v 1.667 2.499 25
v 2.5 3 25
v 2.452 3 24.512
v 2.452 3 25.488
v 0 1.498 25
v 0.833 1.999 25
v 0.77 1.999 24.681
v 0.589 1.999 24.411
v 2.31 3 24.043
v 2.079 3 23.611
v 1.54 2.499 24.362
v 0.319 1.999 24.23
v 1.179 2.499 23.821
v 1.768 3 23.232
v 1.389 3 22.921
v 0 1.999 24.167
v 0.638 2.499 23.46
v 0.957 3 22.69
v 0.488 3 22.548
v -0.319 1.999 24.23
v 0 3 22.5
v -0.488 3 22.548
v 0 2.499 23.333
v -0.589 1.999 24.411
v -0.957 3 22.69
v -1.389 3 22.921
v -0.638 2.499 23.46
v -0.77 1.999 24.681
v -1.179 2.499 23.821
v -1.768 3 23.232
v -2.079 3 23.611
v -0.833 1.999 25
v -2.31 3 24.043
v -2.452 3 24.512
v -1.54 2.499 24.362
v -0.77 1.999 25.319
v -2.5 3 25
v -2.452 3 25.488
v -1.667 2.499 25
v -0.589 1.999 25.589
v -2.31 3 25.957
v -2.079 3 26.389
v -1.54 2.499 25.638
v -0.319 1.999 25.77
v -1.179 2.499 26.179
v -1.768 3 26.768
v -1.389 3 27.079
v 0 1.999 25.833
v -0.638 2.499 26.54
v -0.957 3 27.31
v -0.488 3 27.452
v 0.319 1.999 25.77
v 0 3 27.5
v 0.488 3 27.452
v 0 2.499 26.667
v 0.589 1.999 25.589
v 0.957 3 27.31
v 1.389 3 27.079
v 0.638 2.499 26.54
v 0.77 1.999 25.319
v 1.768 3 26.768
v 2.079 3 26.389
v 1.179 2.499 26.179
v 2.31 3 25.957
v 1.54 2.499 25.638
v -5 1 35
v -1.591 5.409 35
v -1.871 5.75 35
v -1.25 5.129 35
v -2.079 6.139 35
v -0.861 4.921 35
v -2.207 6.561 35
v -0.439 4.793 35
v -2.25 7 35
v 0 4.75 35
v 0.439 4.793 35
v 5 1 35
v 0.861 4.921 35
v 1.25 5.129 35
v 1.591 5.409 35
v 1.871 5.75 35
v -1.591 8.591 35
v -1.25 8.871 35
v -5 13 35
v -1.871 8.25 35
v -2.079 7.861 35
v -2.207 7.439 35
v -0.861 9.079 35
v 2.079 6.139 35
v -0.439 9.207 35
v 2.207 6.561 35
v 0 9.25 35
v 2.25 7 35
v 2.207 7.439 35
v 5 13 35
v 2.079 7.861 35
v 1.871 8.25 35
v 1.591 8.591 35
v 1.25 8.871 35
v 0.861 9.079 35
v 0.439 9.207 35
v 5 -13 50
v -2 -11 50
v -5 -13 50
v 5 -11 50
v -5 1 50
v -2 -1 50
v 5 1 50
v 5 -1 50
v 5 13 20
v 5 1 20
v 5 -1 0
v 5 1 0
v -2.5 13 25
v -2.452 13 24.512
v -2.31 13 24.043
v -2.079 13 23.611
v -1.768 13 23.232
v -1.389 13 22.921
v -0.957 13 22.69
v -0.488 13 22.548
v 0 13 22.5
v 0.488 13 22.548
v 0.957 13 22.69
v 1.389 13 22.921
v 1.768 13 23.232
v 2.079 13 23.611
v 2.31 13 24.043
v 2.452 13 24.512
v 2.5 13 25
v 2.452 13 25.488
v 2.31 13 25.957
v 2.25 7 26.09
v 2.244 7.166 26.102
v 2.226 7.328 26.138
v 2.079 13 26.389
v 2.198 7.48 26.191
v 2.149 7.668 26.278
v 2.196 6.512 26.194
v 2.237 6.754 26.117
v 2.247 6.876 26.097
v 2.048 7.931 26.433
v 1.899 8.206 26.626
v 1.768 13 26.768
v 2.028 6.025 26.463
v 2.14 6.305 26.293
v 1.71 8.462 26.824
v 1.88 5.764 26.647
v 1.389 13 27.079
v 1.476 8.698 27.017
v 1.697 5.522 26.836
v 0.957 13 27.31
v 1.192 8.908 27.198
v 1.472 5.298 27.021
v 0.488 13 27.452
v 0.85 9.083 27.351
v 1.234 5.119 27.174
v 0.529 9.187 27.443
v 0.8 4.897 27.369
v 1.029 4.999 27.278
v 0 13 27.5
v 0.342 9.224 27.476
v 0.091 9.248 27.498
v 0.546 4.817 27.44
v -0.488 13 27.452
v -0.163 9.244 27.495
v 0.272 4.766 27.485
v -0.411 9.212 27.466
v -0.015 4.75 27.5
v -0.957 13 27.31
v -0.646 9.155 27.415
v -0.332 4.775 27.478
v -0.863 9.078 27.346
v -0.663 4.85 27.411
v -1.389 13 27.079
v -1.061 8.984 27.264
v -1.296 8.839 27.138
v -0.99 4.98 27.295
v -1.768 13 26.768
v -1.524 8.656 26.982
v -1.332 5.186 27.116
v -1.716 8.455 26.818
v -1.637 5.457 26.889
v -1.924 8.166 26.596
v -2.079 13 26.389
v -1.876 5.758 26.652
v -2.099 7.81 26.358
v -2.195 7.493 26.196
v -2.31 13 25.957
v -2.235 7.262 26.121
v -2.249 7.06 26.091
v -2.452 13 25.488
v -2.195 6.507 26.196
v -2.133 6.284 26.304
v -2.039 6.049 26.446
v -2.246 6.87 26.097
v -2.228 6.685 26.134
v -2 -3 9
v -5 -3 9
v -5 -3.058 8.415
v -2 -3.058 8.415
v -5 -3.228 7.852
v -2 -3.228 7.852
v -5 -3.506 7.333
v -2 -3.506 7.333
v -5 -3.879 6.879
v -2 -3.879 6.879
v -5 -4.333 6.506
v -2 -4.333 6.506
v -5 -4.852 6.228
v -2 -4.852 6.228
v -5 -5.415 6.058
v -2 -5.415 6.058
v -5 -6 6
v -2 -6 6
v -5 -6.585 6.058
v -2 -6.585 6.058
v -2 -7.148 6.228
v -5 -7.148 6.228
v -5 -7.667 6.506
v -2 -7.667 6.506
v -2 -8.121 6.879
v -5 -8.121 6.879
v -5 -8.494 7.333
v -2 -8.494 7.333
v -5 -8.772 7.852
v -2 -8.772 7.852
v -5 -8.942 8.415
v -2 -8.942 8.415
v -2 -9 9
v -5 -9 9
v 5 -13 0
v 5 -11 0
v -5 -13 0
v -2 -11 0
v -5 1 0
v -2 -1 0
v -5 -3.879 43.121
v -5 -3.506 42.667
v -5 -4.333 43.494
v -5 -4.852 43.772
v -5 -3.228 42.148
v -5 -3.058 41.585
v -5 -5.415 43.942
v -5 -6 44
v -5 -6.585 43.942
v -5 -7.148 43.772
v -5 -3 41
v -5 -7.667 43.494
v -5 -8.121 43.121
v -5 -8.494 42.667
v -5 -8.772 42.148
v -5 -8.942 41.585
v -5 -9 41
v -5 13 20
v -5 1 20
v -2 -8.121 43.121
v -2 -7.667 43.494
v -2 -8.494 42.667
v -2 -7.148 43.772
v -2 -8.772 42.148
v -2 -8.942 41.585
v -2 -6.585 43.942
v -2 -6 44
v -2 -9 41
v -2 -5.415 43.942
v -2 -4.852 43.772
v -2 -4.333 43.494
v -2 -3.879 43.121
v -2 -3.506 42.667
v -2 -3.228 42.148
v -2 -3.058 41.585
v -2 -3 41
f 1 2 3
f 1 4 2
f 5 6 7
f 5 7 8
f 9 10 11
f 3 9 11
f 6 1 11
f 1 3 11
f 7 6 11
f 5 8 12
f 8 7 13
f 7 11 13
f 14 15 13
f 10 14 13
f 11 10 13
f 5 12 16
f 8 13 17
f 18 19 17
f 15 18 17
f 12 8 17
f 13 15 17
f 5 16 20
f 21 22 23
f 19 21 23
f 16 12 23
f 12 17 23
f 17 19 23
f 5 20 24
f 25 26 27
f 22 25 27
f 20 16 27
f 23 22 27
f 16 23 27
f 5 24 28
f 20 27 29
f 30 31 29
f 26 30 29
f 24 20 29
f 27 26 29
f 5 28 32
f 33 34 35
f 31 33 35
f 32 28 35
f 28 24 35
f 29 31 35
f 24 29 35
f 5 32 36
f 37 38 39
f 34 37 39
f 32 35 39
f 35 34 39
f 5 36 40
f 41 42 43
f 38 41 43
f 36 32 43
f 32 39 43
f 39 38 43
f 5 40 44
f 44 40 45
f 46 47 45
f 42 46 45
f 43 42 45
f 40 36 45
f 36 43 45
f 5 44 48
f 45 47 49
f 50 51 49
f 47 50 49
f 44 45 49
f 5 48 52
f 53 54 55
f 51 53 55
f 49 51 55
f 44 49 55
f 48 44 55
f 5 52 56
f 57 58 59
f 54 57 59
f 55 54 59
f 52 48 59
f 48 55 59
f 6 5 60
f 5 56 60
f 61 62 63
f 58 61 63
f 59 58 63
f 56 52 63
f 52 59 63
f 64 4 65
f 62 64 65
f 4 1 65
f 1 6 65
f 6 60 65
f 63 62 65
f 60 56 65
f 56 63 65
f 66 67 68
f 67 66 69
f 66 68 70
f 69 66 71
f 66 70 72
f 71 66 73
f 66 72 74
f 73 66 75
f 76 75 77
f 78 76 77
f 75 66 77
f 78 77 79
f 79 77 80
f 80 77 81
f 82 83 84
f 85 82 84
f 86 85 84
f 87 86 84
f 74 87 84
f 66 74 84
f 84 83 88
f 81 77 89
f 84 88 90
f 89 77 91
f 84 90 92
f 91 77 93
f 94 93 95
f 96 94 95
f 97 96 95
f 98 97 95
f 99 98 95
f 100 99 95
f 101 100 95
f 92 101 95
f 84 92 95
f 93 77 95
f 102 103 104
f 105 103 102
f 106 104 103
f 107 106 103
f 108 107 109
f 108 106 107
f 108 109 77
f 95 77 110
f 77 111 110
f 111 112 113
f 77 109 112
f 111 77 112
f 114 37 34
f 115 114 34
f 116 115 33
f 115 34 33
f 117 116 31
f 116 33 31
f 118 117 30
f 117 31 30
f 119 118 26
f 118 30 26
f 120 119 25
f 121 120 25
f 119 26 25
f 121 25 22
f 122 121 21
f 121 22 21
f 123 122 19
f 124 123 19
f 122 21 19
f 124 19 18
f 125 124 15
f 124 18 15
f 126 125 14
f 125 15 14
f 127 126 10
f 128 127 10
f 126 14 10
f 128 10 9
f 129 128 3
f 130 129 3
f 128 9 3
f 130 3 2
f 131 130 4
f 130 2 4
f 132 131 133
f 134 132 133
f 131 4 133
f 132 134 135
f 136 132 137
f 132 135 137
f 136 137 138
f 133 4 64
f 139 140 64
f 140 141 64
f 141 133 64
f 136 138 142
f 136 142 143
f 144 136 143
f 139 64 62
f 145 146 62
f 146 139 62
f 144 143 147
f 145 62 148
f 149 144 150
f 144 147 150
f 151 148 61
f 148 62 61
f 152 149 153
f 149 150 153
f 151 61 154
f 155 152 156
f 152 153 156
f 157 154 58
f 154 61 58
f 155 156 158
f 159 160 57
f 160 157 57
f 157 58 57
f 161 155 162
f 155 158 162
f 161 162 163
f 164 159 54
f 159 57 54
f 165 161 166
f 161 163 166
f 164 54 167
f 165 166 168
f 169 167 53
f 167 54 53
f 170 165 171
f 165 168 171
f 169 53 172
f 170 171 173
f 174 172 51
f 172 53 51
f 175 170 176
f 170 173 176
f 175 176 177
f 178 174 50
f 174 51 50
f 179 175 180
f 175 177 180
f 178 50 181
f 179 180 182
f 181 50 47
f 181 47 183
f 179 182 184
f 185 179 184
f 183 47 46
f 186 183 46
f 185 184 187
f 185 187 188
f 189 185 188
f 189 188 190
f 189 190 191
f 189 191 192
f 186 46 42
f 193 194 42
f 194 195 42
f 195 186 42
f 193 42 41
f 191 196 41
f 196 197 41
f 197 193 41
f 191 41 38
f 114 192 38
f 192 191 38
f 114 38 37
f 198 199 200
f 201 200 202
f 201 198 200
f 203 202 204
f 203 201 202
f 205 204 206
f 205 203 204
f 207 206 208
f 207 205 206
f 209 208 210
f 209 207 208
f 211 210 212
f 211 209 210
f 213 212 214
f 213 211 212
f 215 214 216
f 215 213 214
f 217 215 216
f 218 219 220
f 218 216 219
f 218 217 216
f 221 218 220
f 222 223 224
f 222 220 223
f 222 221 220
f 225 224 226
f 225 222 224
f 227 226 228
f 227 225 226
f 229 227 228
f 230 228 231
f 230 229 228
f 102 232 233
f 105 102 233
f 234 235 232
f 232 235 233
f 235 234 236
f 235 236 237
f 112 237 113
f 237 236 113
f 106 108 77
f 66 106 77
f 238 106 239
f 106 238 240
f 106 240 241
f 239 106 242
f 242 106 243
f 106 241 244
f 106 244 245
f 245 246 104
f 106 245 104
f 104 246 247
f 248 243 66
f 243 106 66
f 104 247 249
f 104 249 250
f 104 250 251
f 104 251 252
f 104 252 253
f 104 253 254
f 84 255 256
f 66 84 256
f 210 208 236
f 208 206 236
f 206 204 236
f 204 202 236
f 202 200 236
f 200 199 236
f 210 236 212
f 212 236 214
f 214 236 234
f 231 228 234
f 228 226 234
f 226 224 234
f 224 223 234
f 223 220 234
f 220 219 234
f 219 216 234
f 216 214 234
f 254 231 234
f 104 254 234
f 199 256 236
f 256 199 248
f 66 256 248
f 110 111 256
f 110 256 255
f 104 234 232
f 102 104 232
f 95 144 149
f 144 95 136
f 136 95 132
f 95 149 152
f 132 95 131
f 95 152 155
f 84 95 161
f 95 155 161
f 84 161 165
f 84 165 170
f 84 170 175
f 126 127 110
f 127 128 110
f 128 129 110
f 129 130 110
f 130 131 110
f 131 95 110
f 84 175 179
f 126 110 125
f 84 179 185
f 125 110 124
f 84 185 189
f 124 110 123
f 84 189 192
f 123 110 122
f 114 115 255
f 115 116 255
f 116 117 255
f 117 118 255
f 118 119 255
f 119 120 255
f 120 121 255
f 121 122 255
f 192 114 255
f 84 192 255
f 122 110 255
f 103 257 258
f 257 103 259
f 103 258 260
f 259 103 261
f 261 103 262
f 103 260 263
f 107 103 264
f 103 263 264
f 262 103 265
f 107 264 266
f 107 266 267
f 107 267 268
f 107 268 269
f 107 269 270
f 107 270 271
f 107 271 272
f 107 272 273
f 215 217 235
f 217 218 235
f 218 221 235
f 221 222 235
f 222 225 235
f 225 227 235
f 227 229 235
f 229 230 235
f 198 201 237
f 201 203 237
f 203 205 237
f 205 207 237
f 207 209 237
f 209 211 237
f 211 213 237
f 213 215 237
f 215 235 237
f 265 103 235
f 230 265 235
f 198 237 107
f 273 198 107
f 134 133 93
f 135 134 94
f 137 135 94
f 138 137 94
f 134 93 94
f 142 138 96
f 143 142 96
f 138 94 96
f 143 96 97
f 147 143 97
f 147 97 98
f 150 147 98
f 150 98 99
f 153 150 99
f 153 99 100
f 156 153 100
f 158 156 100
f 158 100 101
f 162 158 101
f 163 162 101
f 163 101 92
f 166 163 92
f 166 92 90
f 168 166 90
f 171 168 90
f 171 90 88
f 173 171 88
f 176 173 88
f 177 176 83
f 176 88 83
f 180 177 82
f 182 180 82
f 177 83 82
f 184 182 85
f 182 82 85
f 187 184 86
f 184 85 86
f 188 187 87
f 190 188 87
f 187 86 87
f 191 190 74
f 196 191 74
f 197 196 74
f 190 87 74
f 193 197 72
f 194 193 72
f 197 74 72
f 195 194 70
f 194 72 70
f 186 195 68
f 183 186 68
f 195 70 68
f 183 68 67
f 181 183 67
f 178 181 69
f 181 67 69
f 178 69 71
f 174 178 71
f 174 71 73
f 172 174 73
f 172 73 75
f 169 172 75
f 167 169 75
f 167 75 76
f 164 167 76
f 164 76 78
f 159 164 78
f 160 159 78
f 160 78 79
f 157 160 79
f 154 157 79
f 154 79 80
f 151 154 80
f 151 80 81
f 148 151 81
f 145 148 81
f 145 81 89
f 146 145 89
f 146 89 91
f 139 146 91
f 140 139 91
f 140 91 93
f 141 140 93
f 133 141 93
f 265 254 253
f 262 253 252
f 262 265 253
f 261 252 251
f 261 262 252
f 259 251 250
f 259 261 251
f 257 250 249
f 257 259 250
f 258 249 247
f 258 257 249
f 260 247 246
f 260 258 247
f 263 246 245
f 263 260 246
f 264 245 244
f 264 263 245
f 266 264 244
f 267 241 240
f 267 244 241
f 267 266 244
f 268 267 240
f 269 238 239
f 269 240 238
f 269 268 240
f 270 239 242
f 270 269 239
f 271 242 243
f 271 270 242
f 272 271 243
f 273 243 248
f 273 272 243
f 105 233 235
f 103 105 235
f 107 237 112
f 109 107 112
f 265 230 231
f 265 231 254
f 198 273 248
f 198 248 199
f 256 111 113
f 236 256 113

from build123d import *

# Parameters (mm, degrees)
BOSS_EXTRUDE1_DEPTH       = 50
SKETCH2_W                 = 15
SKETCH2_H                 = 12
SKETCH2_W_2               = 20
CUT_EXTRUDE1_DEPTH        = 50
CUT_EXTRUDE2_DEPTH        = 50
F_5_0MM_DOWEL_HOLE1_D     = 5
F_5_0MM_DOWEL_HOLE1_DEPTH = 10
F_5_0MM_DOWEL_HOLE1_TIP   = 1.502151548
SKETCH7_R                 = 2.25
CUT_EXTRUDE3_DEPTH        = 10


with BuildPart() as part:
    # Sketch1 → Boss-Extrude1 (new body)
    with BuildSketch(Plane.XY):
        Polygon((-2, -1), (5, -1), (5, 13), (-5, 13), (-5, -13), (5, -13), (5, -11), (-2, -11), align=None)
    extrude(amount=BOSS_EXTRUDE1_DEPTH)

    # Sketch2 → Cut-Extrude1 (cut)
    with BuildSketch(Plane(origin=(5, 0, 0), x_dir=(0, 0, -1), z_dir=(1, 0, 0))):
        with Locations((-42.5, 7)):
            Rectangle(SKETCH2_W, SKETCH2_H)
        with Locations((-10, 7)):
            Rectangle(SKETCH2_W_2, SKETCH2_H)
    extrude(amount=-CUT_EXTRUDE1_DEPTH, mode=Mode.SUBTRACT)

    # Sketch3 → Cut-Extrude2 (cut)
    with BuildSketch(Plane(origin=(-2, 0, 0), x_dir=(0, 0, -1), z_dir=(1, 0, 0))):
        with BuildLine():
            Line((-41, -3), (-9, -3))
            ThreePointArc((-9, -3), (-6, -6), (-9, -9))
            Line((-9, -9), (-41, -9))
            ThreePointArc((-41, -9), (-44, -6), (-41, -3))
        make_face()
    extrude(amount=-CUT_EXTRUDE2_DEPTH, mode=Mode.SUBTRACT)

    # Ø5.0mm Dowel Hole1
    with Locations(Plane(origin=(0, 13, 0), x_dir=(1, 0, 0), z_dir=(0, 1, 0))):
        with Locations((0, -25)):
            Hole(F_5_0MM_DOWEL_HOLE1_D / 2, depth=F_5_0MM_DOWEL_HOLE1_DEPTH)
            with Locations((0, 0, -(F_5_0MM_DOWEL_HOLE1_DEPTH + F_5_0MM_DOWEL_HOLE1_TIP / 2))):  # 118° drill point
                Cone(0, F_5_0MM_DOWEL_HOLE1_D / 2, F_5_0MM_DOWEL_HOLE1_TIP, mode=Mode.SUBTRACT)

    # Sketch7 → Cut-Extrude3 (cut)
    with BuildSketch(Plane.XY.offset(35)):
        with Locations((0, 7)):
            Circle(SKETCH7_R)
    extrude(amount=-CUT_EXTRUDE3_DEPTH, mode=Mode.SUBTRACT)


solid = part.part
